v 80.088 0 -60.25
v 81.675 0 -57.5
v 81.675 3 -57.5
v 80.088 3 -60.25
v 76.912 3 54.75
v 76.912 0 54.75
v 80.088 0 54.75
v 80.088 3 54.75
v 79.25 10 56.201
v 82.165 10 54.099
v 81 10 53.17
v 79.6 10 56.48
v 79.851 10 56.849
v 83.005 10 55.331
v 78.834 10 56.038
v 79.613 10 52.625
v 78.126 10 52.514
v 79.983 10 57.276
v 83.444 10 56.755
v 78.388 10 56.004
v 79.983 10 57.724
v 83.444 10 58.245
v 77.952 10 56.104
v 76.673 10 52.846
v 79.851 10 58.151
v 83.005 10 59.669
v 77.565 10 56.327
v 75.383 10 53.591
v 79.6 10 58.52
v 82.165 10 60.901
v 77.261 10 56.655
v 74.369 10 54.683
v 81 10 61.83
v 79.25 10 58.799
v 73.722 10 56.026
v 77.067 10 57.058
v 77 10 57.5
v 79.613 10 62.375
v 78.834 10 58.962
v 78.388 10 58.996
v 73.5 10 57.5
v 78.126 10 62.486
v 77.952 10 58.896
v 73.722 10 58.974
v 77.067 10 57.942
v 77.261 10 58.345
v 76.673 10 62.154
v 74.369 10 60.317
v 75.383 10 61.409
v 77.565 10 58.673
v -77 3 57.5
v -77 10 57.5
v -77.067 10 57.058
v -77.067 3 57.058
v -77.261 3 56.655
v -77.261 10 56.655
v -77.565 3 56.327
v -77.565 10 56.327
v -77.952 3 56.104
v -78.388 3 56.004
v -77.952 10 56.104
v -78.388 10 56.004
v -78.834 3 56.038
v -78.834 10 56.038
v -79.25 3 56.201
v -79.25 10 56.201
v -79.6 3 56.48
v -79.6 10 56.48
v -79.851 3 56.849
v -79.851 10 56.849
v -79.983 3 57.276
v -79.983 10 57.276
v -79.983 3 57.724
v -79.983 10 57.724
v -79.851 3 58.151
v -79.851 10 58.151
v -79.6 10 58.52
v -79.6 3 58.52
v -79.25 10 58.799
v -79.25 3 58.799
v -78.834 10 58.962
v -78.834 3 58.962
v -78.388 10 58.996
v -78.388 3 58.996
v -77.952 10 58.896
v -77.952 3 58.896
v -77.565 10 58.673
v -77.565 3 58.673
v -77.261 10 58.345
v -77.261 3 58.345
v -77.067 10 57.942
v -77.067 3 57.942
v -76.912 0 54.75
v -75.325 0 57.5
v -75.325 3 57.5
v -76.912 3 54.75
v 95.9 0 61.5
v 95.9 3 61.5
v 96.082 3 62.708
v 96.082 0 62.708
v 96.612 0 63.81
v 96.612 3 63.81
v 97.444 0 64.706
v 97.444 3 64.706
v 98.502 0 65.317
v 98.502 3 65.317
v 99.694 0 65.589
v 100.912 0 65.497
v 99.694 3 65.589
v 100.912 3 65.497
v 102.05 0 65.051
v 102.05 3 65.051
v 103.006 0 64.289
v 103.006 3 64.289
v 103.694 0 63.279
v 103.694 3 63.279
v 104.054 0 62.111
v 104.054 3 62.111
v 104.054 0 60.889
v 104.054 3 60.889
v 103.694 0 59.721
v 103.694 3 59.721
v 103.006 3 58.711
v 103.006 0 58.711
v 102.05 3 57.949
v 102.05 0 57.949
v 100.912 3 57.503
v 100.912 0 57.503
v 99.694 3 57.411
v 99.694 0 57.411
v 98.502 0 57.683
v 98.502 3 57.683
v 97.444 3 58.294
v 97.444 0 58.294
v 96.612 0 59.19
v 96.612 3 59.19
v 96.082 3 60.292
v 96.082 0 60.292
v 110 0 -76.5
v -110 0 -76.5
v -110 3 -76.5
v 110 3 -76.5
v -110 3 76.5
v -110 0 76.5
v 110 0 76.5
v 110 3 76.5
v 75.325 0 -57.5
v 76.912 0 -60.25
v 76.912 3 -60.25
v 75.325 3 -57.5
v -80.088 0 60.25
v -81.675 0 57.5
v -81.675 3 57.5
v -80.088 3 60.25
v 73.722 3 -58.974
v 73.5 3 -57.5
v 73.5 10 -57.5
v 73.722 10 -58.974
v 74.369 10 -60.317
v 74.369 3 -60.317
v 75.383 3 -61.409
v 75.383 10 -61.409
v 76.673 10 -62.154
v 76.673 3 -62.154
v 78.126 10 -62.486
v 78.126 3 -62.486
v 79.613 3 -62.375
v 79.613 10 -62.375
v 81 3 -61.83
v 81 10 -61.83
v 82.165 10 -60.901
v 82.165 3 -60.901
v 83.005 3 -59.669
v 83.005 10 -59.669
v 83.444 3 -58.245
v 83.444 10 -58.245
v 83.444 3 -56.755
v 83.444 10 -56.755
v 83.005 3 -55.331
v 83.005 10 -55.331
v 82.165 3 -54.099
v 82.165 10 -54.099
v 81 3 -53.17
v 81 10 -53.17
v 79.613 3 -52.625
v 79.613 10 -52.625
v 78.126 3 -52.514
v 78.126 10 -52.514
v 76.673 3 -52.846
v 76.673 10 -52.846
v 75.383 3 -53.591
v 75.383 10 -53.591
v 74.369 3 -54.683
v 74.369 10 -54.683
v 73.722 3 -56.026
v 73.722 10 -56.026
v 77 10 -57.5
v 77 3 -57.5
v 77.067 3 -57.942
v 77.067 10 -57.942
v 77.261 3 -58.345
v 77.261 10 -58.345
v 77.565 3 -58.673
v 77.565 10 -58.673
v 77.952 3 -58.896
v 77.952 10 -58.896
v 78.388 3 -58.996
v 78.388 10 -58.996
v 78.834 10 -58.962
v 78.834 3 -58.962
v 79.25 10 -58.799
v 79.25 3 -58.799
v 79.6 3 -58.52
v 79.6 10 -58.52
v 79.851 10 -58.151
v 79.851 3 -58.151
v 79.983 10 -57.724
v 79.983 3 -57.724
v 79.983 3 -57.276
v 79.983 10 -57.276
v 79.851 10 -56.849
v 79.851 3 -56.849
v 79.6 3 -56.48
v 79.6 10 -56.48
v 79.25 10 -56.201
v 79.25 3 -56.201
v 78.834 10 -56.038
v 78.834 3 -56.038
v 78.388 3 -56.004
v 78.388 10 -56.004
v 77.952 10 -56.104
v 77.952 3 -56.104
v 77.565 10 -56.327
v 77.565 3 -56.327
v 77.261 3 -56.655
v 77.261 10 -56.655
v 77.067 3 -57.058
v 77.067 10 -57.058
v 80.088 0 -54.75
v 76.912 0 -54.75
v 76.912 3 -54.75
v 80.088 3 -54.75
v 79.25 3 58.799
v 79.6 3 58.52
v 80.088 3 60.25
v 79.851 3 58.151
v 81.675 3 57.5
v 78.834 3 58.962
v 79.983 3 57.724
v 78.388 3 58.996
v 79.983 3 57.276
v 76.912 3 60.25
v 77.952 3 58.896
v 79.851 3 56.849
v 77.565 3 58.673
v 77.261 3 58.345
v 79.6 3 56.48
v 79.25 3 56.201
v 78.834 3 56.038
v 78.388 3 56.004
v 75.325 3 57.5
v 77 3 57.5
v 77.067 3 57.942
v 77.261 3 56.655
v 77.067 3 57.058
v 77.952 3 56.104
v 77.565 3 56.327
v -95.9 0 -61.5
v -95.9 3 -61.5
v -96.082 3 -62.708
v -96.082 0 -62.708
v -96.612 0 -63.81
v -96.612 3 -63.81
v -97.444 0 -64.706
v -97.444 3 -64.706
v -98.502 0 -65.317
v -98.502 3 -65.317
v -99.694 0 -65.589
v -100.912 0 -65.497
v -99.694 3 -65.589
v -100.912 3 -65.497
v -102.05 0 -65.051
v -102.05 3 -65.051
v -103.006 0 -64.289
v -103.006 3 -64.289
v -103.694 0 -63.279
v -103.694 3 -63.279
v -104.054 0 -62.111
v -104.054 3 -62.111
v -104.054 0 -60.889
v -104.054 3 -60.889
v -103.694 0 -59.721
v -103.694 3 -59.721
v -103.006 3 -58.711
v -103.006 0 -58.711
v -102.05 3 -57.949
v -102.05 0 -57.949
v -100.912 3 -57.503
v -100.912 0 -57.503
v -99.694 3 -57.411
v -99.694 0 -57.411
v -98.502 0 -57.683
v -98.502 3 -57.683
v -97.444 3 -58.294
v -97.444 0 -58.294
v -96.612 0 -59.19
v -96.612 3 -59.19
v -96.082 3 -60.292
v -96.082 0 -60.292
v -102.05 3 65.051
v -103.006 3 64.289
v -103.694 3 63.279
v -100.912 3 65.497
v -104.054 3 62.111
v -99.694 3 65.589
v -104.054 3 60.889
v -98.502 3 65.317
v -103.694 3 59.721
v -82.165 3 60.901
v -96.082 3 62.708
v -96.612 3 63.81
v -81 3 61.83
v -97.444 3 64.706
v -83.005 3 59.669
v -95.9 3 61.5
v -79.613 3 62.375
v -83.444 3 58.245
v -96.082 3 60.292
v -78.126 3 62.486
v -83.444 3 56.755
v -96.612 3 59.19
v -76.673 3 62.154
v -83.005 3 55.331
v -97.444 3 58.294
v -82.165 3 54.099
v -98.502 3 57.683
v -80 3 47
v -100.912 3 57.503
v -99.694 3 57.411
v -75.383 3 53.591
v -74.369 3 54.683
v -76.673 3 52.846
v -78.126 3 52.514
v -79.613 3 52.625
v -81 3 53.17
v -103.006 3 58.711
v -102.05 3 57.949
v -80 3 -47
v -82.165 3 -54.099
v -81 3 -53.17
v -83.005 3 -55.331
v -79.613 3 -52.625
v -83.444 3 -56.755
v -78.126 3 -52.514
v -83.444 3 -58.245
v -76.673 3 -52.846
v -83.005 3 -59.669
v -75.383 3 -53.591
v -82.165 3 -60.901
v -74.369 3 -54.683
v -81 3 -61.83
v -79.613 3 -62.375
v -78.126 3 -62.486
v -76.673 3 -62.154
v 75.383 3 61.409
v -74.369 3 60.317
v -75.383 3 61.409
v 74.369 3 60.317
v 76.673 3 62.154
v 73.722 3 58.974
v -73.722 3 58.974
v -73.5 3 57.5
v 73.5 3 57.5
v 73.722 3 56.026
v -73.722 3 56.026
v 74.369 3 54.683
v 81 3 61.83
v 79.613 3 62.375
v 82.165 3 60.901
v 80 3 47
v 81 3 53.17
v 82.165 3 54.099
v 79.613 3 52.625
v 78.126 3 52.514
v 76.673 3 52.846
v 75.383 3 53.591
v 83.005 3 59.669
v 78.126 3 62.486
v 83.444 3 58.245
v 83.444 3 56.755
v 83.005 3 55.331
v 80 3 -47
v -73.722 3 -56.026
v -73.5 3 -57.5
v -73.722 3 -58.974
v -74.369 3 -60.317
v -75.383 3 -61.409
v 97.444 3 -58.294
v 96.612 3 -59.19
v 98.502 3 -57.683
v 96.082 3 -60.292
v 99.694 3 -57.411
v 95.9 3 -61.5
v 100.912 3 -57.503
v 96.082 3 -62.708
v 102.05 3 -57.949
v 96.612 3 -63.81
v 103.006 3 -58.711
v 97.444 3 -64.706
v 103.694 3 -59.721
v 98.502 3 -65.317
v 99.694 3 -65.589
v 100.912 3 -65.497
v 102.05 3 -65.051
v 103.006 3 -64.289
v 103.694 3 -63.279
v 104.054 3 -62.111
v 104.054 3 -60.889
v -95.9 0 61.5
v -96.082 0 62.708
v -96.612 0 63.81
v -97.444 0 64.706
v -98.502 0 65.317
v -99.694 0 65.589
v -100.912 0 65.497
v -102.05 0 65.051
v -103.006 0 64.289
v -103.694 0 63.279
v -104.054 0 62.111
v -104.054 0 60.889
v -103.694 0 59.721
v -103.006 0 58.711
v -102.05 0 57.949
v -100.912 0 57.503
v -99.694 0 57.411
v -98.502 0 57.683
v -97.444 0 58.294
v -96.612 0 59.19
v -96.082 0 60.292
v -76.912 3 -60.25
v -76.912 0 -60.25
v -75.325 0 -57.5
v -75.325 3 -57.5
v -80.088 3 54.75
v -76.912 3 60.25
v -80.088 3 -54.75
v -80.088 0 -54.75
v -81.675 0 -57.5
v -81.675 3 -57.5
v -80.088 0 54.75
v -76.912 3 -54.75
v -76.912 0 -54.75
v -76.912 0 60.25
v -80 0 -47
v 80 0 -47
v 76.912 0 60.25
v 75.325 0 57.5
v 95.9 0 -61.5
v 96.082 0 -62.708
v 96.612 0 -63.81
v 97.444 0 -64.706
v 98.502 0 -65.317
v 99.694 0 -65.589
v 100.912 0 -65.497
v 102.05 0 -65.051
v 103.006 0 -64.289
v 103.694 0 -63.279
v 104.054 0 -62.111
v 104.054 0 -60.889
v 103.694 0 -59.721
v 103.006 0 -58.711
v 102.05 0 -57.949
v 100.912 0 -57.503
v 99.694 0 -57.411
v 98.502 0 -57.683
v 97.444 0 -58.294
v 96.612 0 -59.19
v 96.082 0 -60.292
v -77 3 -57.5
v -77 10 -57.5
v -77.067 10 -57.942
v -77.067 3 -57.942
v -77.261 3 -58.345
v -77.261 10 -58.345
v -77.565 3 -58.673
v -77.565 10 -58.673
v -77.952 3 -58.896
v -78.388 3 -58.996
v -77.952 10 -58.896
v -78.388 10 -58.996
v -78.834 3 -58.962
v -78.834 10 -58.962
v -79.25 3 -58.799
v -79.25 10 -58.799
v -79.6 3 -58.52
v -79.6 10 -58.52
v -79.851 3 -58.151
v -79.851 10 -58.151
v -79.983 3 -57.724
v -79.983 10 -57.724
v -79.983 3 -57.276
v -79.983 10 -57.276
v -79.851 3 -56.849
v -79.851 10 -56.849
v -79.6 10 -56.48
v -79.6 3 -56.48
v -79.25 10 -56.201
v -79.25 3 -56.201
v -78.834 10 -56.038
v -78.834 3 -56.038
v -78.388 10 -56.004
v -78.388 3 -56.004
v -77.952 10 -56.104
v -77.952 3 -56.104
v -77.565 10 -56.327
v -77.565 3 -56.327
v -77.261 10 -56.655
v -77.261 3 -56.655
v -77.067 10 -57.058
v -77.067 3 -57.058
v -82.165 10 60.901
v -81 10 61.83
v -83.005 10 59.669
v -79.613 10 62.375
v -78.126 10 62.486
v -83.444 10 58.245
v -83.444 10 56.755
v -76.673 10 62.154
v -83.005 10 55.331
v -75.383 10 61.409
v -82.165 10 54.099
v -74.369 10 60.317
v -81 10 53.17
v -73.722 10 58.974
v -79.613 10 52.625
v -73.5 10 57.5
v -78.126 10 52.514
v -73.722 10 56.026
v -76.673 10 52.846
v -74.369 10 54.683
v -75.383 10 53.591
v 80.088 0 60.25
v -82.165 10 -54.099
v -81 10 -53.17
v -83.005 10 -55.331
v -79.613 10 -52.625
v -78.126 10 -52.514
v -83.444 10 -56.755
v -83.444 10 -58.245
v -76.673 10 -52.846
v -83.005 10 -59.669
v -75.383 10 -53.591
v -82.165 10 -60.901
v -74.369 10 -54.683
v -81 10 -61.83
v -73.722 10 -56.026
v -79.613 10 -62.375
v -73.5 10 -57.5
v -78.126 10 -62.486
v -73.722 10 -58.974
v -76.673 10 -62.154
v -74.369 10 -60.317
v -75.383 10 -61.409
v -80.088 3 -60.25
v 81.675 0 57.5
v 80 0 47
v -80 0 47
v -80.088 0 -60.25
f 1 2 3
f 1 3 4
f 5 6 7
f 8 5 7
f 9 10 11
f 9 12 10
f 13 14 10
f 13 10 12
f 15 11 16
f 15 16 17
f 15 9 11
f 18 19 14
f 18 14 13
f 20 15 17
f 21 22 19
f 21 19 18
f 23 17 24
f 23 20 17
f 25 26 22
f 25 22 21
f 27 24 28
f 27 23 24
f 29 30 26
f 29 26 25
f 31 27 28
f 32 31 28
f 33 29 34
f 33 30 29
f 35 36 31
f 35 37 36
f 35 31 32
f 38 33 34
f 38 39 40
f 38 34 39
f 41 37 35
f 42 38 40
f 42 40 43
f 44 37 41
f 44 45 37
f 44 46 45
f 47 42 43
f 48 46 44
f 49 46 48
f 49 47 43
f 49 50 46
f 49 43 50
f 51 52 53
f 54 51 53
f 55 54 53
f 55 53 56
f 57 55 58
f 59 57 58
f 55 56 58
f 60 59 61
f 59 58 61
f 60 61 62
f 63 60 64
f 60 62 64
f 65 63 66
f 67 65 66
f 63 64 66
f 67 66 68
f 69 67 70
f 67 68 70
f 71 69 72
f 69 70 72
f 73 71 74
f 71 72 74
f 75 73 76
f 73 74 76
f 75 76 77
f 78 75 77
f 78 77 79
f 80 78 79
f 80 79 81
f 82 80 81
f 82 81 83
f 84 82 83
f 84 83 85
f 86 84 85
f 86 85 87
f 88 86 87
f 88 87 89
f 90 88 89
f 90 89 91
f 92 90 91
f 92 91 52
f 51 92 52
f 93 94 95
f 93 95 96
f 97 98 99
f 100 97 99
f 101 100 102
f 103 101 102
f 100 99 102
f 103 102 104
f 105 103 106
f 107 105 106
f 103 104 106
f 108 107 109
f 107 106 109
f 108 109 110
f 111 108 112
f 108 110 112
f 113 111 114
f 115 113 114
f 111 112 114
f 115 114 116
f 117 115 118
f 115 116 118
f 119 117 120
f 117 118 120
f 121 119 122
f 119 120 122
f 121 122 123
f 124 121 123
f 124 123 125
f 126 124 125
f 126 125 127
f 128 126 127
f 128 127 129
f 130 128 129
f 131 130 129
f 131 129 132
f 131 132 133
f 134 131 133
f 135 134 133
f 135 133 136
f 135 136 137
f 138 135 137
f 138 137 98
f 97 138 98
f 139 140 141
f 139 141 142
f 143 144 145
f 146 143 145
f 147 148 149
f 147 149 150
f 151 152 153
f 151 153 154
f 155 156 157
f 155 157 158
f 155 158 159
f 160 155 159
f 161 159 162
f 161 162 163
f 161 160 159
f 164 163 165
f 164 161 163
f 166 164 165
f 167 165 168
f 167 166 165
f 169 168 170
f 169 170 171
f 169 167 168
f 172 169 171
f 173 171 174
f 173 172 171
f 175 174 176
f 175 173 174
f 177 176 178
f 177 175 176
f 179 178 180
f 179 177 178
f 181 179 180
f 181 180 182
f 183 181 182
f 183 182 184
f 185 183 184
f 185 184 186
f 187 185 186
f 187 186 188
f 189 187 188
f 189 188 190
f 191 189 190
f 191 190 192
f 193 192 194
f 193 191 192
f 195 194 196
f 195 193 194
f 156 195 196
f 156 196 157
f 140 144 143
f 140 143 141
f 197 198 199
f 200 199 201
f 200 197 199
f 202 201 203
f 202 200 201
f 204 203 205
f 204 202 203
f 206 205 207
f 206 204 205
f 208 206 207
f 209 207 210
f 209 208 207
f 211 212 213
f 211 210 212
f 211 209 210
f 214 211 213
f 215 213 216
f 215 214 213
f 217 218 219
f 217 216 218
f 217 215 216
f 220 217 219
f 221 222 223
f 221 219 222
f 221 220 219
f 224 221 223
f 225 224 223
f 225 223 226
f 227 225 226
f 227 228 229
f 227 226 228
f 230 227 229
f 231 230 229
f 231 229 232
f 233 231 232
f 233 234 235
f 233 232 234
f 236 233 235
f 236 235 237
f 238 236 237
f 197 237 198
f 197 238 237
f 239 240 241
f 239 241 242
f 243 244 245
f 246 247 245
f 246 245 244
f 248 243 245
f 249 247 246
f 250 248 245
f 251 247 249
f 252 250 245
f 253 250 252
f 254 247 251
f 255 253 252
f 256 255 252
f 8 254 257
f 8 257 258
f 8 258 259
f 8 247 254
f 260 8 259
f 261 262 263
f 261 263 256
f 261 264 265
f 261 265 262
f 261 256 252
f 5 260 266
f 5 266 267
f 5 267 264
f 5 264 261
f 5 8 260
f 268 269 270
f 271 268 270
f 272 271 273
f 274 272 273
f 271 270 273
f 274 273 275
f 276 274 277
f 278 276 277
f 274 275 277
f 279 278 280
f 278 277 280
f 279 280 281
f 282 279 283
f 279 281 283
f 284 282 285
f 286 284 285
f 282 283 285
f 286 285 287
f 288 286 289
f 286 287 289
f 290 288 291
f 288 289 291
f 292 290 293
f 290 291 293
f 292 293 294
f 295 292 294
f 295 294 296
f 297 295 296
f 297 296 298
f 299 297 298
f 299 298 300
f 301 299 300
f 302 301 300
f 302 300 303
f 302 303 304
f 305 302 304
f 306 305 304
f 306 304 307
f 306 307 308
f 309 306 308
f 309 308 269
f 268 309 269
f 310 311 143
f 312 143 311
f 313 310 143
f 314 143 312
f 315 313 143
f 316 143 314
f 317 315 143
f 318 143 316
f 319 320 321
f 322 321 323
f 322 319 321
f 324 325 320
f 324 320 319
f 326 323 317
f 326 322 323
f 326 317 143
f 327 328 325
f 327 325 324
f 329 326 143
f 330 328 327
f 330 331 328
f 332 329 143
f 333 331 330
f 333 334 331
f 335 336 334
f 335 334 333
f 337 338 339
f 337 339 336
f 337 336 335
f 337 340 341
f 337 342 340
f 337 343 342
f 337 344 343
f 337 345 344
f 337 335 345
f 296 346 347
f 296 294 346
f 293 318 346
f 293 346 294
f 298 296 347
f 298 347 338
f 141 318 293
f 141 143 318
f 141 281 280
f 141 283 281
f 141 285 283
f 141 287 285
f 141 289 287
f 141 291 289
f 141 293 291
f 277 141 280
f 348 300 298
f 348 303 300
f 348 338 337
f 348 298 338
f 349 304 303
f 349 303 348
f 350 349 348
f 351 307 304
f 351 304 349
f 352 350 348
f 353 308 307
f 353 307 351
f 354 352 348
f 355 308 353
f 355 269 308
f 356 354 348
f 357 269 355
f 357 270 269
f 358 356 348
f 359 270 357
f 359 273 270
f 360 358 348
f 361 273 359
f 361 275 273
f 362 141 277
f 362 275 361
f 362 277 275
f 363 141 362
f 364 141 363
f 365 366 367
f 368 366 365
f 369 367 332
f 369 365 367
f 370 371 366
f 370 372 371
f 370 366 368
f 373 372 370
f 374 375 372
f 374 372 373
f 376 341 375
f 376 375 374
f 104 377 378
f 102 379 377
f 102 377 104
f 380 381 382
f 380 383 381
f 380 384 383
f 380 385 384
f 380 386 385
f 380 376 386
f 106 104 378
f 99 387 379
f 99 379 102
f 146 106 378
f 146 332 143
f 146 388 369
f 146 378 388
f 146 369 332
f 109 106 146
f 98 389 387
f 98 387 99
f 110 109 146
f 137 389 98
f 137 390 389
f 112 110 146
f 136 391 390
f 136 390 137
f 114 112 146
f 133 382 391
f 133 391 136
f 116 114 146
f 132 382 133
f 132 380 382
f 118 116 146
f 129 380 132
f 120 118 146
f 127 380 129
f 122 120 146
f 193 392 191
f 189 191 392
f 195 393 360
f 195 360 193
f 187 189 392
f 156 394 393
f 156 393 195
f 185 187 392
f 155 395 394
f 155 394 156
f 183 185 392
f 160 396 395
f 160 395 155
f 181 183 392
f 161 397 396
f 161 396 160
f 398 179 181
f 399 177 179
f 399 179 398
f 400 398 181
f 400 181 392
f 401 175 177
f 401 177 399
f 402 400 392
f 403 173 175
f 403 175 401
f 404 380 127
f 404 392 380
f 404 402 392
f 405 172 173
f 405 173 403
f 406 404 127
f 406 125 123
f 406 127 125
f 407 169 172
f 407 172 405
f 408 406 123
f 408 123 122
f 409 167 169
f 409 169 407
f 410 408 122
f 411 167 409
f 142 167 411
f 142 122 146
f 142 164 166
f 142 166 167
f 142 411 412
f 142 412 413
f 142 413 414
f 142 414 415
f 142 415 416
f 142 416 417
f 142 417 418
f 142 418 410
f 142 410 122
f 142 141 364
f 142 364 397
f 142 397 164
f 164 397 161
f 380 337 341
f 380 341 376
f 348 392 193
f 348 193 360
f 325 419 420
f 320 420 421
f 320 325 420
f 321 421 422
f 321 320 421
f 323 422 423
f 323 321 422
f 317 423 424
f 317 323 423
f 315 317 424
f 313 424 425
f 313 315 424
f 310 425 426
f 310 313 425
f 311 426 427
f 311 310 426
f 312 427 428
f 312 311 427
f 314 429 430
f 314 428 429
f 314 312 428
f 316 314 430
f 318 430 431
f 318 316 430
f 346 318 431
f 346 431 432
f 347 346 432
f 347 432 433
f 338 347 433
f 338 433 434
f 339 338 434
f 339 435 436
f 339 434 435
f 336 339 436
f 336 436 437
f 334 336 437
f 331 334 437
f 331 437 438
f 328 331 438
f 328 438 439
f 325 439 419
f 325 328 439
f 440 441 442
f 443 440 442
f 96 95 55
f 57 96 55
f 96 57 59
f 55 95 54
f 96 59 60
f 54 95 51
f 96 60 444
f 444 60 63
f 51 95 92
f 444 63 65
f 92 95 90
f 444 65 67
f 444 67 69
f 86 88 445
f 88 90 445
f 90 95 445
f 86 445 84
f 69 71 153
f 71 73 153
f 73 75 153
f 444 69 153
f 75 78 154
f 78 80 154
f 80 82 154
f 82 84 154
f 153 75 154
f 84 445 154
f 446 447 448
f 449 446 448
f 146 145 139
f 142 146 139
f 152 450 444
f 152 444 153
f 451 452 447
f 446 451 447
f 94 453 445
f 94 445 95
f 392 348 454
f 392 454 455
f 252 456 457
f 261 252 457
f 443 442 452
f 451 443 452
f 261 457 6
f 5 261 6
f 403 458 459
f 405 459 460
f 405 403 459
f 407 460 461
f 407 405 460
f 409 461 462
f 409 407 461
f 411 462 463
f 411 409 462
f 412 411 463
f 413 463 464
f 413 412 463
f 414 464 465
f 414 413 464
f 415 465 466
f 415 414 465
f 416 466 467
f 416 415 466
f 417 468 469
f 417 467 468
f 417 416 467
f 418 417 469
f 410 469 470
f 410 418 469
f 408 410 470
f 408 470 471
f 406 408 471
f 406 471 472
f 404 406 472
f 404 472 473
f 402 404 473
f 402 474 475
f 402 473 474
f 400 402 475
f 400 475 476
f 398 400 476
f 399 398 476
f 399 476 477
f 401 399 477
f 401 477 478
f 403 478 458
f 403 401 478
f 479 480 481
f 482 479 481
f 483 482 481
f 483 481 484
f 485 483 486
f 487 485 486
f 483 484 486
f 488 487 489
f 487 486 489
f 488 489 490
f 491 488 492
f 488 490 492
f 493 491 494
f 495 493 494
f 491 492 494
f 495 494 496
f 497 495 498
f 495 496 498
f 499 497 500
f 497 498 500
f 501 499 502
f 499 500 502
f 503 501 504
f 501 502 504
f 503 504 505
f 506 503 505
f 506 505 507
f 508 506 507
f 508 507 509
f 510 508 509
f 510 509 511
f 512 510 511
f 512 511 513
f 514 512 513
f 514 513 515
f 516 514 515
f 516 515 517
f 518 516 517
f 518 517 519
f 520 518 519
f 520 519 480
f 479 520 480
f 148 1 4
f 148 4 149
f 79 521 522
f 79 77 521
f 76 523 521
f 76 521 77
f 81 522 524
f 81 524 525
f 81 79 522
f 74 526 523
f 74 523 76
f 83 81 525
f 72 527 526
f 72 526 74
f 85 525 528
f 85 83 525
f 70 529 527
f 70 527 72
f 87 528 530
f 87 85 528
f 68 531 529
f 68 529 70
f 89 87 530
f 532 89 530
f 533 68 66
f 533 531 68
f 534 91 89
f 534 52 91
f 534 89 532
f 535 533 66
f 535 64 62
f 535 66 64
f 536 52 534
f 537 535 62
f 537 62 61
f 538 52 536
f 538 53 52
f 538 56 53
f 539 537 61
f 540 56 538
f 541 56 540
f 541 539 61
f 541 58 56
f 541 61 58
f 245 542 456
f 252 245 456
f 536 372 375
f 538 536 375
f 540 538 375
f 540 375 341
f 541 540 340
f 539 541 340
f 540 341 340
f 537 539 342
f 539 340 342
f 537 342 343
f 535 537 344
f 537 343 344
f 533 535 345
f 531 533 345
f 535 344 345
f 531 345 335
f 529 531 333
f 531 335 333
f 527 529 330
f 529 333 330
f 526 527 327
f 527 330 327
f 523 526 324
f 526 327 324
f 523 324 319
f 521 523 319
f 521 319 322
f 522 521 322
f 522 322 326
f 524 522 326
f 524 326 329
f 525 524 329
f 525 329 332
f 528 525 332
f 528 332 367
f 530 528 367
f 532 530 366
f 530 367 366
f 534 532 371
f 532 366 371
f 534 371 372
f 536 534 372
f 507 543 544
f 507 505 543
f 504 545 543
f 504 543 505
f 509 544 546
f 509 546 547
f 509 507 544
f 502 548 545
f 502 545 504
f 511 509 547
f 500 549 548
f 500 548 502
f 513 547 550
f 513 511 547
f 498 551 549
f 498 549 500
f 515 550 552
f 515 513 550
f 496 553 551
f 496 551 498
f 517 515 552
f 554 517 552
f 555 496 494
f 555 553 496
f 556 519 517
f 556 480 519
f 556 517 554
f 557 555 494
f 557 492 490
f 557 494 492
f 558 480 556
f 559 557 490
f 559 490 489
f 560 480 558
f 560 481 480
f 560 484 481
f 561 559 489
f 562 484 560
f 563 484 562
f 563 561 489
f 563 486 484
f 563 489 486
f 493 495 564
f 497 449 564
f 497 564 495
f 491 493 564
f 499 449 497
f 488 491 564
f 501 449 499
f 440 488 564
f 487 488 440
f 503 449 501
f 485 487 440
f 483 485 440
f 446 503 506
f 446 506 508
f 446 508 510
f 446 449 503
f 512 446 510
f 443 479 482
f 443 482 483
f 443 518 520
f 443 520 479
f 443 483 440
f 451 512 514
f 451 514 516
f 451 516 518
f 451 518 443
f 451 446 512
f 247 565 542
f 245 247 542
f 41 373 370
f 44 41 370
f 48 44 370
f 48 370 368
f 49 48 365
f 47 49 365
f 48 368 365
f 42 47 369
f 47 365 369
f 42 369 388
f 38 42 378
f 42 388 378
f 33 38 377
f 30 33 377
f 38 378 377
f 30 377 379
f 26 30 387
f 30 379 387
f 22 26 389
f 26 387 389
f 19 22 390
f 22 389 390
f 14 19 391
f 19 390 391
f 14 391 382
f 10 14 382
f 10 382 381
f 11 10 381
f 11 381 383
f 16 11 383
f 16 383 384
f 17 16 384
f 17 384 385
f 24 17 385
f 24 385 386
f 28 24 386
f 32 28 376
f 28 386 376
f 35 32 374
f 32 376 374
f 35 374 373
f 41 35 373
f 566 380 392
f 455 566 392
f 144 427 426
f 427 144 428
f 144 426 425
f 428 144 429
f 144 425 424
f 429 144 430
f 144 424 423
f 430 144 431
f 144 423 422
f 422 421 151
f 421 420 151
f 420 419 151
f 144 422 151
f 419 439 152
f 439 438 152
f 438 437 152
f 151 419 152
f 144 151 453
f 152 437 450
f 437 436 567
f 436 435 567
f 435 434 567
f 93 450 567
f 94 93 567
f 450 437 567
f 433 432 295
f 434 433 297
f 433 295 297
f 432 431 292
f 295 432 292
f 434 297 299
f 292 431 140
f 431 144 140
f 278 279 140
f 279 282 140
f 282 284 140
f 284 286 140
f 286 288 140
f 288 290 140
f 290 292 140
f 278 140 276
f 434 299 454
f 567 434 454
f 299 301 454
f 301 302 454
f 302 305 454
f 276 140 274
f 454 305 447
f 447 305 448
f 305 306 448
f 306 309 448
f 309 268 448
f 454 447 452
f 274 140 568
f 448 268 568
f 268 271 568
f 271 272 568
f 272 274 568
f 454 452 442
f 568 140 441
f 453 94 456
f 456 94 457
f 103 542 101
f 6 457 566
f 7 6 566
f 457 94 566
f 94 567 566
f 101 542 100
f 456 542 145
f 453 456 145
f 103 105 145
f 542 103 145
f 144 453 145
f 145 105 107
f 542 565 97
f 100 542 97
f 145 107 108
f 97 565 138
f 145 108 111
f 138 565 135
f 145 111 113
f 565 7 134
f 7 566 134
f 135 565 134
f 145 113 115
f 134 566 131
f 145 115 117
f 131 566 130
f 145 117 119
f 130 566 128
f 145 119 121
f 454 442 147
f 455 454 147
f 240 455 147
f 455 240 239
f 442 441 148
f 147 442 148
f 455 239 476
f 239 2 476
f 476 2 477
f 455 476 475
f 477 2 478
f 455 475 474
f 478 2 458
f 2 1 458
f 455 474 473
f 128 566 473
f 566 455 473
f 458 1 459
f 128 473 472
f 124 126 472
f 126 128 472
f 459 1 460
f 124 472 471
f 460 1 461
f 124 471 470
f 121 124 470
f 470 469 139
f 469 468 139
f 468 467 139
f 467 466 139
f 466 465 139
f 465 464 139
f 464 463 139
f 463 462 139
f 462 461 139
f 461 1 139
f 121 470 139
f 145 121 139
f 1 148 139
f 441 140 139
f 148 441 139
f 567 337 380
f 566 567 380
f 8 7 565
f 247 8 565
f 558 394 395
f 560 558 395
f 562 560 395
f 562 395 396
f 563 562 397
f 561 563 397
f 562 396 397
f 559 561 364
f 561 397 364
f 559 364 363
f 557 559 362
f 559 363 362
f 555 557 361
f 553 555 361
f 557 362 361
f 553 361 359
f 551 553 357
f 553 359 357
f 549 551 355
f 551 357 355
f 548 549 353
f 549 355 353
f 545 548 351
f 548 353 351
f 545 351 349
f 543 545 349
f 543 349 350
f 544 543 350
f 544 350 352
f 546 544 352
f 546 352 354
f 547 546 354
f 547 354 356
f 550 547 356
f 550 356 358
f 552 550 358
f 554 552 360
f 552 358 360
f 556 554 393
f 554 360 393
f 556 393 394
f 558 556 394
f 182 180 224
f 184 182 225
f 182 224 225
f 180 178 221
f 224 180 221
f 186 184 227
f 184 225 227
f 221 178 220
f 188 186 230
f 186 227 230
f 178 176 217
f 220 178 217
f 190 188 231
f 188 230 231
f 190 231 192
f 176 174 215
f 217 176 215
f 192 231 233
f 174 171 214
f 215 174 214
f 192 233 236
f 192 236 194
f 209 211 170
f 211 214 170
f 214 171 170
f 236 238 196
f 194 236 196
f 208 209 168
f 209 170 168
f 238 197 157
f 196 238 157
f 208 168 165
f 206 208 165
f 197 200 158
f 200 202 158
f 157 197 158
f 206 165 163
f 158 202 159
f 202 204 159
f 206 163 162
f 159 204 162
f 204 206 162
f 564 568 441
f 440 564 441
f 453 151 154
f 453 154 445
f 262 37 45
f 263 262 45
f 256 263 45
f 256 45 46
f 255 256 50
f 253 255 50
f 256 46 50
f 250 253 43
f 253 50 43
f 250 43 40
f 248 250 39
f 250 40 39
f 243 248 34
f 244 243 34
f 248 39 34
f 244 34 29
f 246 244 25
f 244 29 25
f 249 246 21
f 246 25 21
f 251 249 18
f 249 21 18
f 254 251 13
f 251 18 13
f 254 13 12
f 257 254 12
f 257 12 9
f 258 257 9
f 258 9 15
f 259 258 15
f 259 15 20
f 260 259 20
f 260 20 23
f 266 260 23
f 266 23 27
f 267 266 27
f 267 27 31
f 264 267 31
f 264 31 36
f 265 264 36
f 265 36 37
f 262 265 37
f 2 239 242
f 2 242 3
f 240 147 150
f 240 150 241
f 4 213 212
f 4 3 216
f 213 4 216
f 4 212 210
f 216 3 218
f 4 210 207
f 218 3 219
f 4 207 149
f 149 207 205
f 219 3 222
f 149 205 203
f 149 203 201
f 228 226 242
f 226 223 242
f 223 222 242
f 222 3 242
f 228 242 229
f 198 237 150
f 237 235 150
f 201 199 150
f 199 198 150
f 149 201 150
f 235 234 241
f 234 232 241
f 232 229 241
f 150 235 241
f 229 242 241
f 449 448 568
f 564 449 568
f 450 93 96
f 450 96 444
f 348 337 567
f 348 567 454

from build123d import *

# Parameters (mm, degrees)
CROQUIS1_W                = 220
CROQUIS1_H                = 153
SALIENTE_EXTRUIR1_DEPTH   = 3
CROQUIS2_W                = 160
CROQUIS2_H                = 94
CORTAR_EXTRUIR1_DEPTH     = 4
CROQUIS3_R                = 4.1
CORTAR_EXTRUIR2_DEPTH     = 4
CROQUIS4_R                = 5
SALIENTE_EXTRUIR2_DEPTH   = 7
CROQUIS5_R                = 1.5
CORTAR_EXTRUIR3_DEPTH     = 11
CORTAR_EXTRUIR4_DEPTH     = 3
SIMETR_A2_COPY_1_SKETCH_R = 4.1
SIMETR_A2_COPY_1_DEPTH    = 4
SIMETR_A2_COPY_2_SKETCH_R = 5
SIMETR_A2_COPY_2_DEPTH    = 7
SIMETR_A2_COPY_3_SKETCH_R = 1.5
SIMETR_A2_COPY_3_DEPTH    = 11
SIMETR_A2_COPY_4_DEPTH    = 3
SIMETR_A2_COPY_5_SKETCH_R = 5
SIMETR_A2_COPY_5_DEPTH    = 7
SIMETR_A2_COPY_6_SKETCH_R = 1.5
SIMETR_A2_COPY_6_DEPTH    = 11
SIMETR_A2_COPY_7_DEPTH    = 3


with BuildPart() as part:
    # Croquis1 → Saliente-Extruir1 (new body)
    with BuildSketch(Plane(origin=(0, 0, 0), x_dir=(1, 0, 0), z_dir=(0, 1, 0))):
        Rectangle(CROQUIS1_W, CROQUIS1_H)
    extrude(amount=SALIENTE_EXTRUIR1_DEPTH)

    # Croquis2 → Cortar-Extruir1 (cut, through all)
    with BuildSketch(Plane(origin=(0, 3, 0), x_dir=(1, 0, 0), z_dir=(0, 1, 0))):
        Rectangle(CROQUIS2_W, CROQUIS2_H)
    cortar_extruir1 = extrude(amount=-CORTAR_EXTRUIR1_DEPTH, mode=Mode.SUBTRACT)

    # Croquis3 → Cortar-Extruir2 (cut, through all)
    with BuildSketch(Plane(origin=(0, 3, 0), x_dir=(1, 0, 0), z_dir=(0, 1, 0))):
        with Locations((-100, 61.5)):
            Circle(CROQUIS3_R)
    cortar_extruir2 = extrude(amount=-CORTAR_EXTRUIR2_DEPTH, mode=Mode.SUBTRACT)

    # Croquis4 → Saliente-Extruir2 (add)
    with BuildSketch(Plane(origin=(0, 3, 0), x_dir=(1, 0, 0), z_dir=(0, 1, 0))):
        with Locations((-78.5, 57.5)):
            Circle(CROQUIS4_R)
    saliente_extruir2 = extrude(amount=SALIENTE_EXTRUIR2_DEPTH)

    # Croquis5 → Cortar-Extruir3 (cut, through all)
    with BuildSketch(Plane(origin=(0, 10, 0), x_dir=(1, 0, 0), z_dir=(0, 1, 0))):
        with Locations((-78.5, 57.5)):
            Circle(CROQUIS5_R)
    cortar_extruir3 = extrude(amount=-CORTAR_EXTRUIR3_DEPTH, mode=Mode.SUBTRACT)

    # Croquis6 → Cortar-Extruir4 (cut)
    with BuildSketch(Plane.XZ):
        Polygon((-81.675426481, -57.5), (-80.08771324, -60.25), (-76.91228676, -60.25), (-75.324573519, -57.5), (-76.91228676, -54.75), (-80.08771324, -54.75), align=None)
    cortar_extruir4 = extrude(amount=-CORTAR_EXTRUIR4_DEPTH, mode=Mode.SUBTRACT)

    # Simetría1: Cortar-Extruir2, Saliente-Extruir2, Cortar-Extruir3, Cortar-Extruir4 across plane
    add(cortar_extruir2.mirror(Plane(origin=(0, 0, 0), x_dir=(0, 0, 1), z_dir=(1, 0, 0))), mode=Mode.SUBTRACT)
    add(saliente_extruir2.mirror(Plane(origin=(0, 0, 0), x_dir=(0, 0, 1), z_dir=(1, 0, 0))))
    add(cortar_extruir3.mirror(Plane(origin=(0, 0, 0), x_dir=(0, 0, 1), z_dir=(1, 0, 0))), mode=Mode.SUBTRACT)
    add(cortar_extruir4.mirror(Plane(origin=(0, 0, 0), x_dir=(0, 0, 1), z_dir=(1, 0, 0))), mode=Mode.SUBTRACT)

    # Simetría2: Cortar-Extruir1, Cortar-Extruir2 across plane
    add(cortar_extruir1.mirror(Plane.XY), mode=Mode.SUBTRACT)
    add(cortar_extruir2.mirror(Plane.XY), mode=Mode.SUBTRACT)

    # Simetría2 copy 1 sketch → Simetría2 copy 1 (cut, through all)
    with BuildSketch(Plane(origin=(0, 3, 0), x_dir=(-1, 0, 0), z_dir=(0, 1, 0))):
        with Locations((-100, 61.5)):
            Circle(SIMETR_A2_COPY_1_SKETCH_R)
    extrude(amount=-SIMETR_A2_COPY_1_DEPTH, mode=Mode.SUBTRACT)

    # Simetría2 copy 2 sketch → Simetría2 copy 2 (add)
    with BuildSketch(Plane(origin=(0, 3, 0), x_dir=(-1, 0, 0), z_dir=(0, 1, 0))):
        with Locations((-78.5, 57.5)):
            Circle(SIMETR_A2_COPY_2_SKETCH_R)
    extrude(amount=SIMETR_A2_COPY_2_DEPTH)

    # Simetría2 copy 3 sketch → Simetría2 copy 3 (cut, through all)
    with BuildSketch(Plane(origin=(0, 10, 0), x_dir=(-1, 0, 0), z_dir=(0, 1, 0))):
        with Locations((-78.5, 57.5)):
            Circle(SIMETR_A2_COPY_3_SKETCH_R)
    extrude(amount=-SIMETR_A2_COPY_3_DEPTH, mode=Mode.SUBTRACT)

    # Simetría2 copy 4 sketch → Simetría2 copy 4 (cut)
    with BuildSketch(Plane(origin=(0, 0, 0), x_dir=(-1, 0, 0), z_dir=(0, -1, 0))):
        Polygon((-81.675426481, -57.5), (-80.08771324, -60.25), (-76.91228676, -60.25), (-75.324573519, -57.5), (-76.91228676, -54.75), (-80.08771324, -54.75), align=None)
    extrude(amount=-SIMETR_A2_COPY_4_DEPTH, mode=Mode.SUBTRACT)

    # Simetría2 copy 5 sketch → Simetría2 copy 5 (add)
    with BuildSketch(Plane(origin=(0, 3, 0), x_dir=(1, 0, 0), z_dir=(0, 1, 0))):
        with Locations((-78.5, -57.5)):
            Circle(SIMETR_A2_COPY_5_SKETCH_R)
    extrude(amount=SIMETR_A2_COPY_5_DEPTH)

    # Simetría2 copy 6 sketch → Simetría2 copy 6 (cut, through all)
    with BuildSketch(Plane(origin=(0, 10, 0), x_dir=(1, 0, 0), z_dir=(0, 1, 0))):
        with Locations((-78.5, -57.5)):
            Circle(SIMETR_A2_COPY_6_SKETCH_R)
    extrude(amount=-SIMETR_A2_COPY_6_DEPTH, mode=Mode.SUBTRACT)

    # Simetría2 copy 7 sketch → Simetría2 copy 7 (cut)
    with BuildSketch(Plane.XZ):
        Polygon((-81.675426481, 57.5), (-80.08771324, 60.25), (-76.91228676, 60.25), (-75.324573519, 57.5), (-76.91228676, 54.75), (-80.08771324, 54.75), align=None)
    extrude(amount=-SIMETR_A2_COPY_7_DEPTH, mode=Mode.SUBTRACT)


solid = part.part
